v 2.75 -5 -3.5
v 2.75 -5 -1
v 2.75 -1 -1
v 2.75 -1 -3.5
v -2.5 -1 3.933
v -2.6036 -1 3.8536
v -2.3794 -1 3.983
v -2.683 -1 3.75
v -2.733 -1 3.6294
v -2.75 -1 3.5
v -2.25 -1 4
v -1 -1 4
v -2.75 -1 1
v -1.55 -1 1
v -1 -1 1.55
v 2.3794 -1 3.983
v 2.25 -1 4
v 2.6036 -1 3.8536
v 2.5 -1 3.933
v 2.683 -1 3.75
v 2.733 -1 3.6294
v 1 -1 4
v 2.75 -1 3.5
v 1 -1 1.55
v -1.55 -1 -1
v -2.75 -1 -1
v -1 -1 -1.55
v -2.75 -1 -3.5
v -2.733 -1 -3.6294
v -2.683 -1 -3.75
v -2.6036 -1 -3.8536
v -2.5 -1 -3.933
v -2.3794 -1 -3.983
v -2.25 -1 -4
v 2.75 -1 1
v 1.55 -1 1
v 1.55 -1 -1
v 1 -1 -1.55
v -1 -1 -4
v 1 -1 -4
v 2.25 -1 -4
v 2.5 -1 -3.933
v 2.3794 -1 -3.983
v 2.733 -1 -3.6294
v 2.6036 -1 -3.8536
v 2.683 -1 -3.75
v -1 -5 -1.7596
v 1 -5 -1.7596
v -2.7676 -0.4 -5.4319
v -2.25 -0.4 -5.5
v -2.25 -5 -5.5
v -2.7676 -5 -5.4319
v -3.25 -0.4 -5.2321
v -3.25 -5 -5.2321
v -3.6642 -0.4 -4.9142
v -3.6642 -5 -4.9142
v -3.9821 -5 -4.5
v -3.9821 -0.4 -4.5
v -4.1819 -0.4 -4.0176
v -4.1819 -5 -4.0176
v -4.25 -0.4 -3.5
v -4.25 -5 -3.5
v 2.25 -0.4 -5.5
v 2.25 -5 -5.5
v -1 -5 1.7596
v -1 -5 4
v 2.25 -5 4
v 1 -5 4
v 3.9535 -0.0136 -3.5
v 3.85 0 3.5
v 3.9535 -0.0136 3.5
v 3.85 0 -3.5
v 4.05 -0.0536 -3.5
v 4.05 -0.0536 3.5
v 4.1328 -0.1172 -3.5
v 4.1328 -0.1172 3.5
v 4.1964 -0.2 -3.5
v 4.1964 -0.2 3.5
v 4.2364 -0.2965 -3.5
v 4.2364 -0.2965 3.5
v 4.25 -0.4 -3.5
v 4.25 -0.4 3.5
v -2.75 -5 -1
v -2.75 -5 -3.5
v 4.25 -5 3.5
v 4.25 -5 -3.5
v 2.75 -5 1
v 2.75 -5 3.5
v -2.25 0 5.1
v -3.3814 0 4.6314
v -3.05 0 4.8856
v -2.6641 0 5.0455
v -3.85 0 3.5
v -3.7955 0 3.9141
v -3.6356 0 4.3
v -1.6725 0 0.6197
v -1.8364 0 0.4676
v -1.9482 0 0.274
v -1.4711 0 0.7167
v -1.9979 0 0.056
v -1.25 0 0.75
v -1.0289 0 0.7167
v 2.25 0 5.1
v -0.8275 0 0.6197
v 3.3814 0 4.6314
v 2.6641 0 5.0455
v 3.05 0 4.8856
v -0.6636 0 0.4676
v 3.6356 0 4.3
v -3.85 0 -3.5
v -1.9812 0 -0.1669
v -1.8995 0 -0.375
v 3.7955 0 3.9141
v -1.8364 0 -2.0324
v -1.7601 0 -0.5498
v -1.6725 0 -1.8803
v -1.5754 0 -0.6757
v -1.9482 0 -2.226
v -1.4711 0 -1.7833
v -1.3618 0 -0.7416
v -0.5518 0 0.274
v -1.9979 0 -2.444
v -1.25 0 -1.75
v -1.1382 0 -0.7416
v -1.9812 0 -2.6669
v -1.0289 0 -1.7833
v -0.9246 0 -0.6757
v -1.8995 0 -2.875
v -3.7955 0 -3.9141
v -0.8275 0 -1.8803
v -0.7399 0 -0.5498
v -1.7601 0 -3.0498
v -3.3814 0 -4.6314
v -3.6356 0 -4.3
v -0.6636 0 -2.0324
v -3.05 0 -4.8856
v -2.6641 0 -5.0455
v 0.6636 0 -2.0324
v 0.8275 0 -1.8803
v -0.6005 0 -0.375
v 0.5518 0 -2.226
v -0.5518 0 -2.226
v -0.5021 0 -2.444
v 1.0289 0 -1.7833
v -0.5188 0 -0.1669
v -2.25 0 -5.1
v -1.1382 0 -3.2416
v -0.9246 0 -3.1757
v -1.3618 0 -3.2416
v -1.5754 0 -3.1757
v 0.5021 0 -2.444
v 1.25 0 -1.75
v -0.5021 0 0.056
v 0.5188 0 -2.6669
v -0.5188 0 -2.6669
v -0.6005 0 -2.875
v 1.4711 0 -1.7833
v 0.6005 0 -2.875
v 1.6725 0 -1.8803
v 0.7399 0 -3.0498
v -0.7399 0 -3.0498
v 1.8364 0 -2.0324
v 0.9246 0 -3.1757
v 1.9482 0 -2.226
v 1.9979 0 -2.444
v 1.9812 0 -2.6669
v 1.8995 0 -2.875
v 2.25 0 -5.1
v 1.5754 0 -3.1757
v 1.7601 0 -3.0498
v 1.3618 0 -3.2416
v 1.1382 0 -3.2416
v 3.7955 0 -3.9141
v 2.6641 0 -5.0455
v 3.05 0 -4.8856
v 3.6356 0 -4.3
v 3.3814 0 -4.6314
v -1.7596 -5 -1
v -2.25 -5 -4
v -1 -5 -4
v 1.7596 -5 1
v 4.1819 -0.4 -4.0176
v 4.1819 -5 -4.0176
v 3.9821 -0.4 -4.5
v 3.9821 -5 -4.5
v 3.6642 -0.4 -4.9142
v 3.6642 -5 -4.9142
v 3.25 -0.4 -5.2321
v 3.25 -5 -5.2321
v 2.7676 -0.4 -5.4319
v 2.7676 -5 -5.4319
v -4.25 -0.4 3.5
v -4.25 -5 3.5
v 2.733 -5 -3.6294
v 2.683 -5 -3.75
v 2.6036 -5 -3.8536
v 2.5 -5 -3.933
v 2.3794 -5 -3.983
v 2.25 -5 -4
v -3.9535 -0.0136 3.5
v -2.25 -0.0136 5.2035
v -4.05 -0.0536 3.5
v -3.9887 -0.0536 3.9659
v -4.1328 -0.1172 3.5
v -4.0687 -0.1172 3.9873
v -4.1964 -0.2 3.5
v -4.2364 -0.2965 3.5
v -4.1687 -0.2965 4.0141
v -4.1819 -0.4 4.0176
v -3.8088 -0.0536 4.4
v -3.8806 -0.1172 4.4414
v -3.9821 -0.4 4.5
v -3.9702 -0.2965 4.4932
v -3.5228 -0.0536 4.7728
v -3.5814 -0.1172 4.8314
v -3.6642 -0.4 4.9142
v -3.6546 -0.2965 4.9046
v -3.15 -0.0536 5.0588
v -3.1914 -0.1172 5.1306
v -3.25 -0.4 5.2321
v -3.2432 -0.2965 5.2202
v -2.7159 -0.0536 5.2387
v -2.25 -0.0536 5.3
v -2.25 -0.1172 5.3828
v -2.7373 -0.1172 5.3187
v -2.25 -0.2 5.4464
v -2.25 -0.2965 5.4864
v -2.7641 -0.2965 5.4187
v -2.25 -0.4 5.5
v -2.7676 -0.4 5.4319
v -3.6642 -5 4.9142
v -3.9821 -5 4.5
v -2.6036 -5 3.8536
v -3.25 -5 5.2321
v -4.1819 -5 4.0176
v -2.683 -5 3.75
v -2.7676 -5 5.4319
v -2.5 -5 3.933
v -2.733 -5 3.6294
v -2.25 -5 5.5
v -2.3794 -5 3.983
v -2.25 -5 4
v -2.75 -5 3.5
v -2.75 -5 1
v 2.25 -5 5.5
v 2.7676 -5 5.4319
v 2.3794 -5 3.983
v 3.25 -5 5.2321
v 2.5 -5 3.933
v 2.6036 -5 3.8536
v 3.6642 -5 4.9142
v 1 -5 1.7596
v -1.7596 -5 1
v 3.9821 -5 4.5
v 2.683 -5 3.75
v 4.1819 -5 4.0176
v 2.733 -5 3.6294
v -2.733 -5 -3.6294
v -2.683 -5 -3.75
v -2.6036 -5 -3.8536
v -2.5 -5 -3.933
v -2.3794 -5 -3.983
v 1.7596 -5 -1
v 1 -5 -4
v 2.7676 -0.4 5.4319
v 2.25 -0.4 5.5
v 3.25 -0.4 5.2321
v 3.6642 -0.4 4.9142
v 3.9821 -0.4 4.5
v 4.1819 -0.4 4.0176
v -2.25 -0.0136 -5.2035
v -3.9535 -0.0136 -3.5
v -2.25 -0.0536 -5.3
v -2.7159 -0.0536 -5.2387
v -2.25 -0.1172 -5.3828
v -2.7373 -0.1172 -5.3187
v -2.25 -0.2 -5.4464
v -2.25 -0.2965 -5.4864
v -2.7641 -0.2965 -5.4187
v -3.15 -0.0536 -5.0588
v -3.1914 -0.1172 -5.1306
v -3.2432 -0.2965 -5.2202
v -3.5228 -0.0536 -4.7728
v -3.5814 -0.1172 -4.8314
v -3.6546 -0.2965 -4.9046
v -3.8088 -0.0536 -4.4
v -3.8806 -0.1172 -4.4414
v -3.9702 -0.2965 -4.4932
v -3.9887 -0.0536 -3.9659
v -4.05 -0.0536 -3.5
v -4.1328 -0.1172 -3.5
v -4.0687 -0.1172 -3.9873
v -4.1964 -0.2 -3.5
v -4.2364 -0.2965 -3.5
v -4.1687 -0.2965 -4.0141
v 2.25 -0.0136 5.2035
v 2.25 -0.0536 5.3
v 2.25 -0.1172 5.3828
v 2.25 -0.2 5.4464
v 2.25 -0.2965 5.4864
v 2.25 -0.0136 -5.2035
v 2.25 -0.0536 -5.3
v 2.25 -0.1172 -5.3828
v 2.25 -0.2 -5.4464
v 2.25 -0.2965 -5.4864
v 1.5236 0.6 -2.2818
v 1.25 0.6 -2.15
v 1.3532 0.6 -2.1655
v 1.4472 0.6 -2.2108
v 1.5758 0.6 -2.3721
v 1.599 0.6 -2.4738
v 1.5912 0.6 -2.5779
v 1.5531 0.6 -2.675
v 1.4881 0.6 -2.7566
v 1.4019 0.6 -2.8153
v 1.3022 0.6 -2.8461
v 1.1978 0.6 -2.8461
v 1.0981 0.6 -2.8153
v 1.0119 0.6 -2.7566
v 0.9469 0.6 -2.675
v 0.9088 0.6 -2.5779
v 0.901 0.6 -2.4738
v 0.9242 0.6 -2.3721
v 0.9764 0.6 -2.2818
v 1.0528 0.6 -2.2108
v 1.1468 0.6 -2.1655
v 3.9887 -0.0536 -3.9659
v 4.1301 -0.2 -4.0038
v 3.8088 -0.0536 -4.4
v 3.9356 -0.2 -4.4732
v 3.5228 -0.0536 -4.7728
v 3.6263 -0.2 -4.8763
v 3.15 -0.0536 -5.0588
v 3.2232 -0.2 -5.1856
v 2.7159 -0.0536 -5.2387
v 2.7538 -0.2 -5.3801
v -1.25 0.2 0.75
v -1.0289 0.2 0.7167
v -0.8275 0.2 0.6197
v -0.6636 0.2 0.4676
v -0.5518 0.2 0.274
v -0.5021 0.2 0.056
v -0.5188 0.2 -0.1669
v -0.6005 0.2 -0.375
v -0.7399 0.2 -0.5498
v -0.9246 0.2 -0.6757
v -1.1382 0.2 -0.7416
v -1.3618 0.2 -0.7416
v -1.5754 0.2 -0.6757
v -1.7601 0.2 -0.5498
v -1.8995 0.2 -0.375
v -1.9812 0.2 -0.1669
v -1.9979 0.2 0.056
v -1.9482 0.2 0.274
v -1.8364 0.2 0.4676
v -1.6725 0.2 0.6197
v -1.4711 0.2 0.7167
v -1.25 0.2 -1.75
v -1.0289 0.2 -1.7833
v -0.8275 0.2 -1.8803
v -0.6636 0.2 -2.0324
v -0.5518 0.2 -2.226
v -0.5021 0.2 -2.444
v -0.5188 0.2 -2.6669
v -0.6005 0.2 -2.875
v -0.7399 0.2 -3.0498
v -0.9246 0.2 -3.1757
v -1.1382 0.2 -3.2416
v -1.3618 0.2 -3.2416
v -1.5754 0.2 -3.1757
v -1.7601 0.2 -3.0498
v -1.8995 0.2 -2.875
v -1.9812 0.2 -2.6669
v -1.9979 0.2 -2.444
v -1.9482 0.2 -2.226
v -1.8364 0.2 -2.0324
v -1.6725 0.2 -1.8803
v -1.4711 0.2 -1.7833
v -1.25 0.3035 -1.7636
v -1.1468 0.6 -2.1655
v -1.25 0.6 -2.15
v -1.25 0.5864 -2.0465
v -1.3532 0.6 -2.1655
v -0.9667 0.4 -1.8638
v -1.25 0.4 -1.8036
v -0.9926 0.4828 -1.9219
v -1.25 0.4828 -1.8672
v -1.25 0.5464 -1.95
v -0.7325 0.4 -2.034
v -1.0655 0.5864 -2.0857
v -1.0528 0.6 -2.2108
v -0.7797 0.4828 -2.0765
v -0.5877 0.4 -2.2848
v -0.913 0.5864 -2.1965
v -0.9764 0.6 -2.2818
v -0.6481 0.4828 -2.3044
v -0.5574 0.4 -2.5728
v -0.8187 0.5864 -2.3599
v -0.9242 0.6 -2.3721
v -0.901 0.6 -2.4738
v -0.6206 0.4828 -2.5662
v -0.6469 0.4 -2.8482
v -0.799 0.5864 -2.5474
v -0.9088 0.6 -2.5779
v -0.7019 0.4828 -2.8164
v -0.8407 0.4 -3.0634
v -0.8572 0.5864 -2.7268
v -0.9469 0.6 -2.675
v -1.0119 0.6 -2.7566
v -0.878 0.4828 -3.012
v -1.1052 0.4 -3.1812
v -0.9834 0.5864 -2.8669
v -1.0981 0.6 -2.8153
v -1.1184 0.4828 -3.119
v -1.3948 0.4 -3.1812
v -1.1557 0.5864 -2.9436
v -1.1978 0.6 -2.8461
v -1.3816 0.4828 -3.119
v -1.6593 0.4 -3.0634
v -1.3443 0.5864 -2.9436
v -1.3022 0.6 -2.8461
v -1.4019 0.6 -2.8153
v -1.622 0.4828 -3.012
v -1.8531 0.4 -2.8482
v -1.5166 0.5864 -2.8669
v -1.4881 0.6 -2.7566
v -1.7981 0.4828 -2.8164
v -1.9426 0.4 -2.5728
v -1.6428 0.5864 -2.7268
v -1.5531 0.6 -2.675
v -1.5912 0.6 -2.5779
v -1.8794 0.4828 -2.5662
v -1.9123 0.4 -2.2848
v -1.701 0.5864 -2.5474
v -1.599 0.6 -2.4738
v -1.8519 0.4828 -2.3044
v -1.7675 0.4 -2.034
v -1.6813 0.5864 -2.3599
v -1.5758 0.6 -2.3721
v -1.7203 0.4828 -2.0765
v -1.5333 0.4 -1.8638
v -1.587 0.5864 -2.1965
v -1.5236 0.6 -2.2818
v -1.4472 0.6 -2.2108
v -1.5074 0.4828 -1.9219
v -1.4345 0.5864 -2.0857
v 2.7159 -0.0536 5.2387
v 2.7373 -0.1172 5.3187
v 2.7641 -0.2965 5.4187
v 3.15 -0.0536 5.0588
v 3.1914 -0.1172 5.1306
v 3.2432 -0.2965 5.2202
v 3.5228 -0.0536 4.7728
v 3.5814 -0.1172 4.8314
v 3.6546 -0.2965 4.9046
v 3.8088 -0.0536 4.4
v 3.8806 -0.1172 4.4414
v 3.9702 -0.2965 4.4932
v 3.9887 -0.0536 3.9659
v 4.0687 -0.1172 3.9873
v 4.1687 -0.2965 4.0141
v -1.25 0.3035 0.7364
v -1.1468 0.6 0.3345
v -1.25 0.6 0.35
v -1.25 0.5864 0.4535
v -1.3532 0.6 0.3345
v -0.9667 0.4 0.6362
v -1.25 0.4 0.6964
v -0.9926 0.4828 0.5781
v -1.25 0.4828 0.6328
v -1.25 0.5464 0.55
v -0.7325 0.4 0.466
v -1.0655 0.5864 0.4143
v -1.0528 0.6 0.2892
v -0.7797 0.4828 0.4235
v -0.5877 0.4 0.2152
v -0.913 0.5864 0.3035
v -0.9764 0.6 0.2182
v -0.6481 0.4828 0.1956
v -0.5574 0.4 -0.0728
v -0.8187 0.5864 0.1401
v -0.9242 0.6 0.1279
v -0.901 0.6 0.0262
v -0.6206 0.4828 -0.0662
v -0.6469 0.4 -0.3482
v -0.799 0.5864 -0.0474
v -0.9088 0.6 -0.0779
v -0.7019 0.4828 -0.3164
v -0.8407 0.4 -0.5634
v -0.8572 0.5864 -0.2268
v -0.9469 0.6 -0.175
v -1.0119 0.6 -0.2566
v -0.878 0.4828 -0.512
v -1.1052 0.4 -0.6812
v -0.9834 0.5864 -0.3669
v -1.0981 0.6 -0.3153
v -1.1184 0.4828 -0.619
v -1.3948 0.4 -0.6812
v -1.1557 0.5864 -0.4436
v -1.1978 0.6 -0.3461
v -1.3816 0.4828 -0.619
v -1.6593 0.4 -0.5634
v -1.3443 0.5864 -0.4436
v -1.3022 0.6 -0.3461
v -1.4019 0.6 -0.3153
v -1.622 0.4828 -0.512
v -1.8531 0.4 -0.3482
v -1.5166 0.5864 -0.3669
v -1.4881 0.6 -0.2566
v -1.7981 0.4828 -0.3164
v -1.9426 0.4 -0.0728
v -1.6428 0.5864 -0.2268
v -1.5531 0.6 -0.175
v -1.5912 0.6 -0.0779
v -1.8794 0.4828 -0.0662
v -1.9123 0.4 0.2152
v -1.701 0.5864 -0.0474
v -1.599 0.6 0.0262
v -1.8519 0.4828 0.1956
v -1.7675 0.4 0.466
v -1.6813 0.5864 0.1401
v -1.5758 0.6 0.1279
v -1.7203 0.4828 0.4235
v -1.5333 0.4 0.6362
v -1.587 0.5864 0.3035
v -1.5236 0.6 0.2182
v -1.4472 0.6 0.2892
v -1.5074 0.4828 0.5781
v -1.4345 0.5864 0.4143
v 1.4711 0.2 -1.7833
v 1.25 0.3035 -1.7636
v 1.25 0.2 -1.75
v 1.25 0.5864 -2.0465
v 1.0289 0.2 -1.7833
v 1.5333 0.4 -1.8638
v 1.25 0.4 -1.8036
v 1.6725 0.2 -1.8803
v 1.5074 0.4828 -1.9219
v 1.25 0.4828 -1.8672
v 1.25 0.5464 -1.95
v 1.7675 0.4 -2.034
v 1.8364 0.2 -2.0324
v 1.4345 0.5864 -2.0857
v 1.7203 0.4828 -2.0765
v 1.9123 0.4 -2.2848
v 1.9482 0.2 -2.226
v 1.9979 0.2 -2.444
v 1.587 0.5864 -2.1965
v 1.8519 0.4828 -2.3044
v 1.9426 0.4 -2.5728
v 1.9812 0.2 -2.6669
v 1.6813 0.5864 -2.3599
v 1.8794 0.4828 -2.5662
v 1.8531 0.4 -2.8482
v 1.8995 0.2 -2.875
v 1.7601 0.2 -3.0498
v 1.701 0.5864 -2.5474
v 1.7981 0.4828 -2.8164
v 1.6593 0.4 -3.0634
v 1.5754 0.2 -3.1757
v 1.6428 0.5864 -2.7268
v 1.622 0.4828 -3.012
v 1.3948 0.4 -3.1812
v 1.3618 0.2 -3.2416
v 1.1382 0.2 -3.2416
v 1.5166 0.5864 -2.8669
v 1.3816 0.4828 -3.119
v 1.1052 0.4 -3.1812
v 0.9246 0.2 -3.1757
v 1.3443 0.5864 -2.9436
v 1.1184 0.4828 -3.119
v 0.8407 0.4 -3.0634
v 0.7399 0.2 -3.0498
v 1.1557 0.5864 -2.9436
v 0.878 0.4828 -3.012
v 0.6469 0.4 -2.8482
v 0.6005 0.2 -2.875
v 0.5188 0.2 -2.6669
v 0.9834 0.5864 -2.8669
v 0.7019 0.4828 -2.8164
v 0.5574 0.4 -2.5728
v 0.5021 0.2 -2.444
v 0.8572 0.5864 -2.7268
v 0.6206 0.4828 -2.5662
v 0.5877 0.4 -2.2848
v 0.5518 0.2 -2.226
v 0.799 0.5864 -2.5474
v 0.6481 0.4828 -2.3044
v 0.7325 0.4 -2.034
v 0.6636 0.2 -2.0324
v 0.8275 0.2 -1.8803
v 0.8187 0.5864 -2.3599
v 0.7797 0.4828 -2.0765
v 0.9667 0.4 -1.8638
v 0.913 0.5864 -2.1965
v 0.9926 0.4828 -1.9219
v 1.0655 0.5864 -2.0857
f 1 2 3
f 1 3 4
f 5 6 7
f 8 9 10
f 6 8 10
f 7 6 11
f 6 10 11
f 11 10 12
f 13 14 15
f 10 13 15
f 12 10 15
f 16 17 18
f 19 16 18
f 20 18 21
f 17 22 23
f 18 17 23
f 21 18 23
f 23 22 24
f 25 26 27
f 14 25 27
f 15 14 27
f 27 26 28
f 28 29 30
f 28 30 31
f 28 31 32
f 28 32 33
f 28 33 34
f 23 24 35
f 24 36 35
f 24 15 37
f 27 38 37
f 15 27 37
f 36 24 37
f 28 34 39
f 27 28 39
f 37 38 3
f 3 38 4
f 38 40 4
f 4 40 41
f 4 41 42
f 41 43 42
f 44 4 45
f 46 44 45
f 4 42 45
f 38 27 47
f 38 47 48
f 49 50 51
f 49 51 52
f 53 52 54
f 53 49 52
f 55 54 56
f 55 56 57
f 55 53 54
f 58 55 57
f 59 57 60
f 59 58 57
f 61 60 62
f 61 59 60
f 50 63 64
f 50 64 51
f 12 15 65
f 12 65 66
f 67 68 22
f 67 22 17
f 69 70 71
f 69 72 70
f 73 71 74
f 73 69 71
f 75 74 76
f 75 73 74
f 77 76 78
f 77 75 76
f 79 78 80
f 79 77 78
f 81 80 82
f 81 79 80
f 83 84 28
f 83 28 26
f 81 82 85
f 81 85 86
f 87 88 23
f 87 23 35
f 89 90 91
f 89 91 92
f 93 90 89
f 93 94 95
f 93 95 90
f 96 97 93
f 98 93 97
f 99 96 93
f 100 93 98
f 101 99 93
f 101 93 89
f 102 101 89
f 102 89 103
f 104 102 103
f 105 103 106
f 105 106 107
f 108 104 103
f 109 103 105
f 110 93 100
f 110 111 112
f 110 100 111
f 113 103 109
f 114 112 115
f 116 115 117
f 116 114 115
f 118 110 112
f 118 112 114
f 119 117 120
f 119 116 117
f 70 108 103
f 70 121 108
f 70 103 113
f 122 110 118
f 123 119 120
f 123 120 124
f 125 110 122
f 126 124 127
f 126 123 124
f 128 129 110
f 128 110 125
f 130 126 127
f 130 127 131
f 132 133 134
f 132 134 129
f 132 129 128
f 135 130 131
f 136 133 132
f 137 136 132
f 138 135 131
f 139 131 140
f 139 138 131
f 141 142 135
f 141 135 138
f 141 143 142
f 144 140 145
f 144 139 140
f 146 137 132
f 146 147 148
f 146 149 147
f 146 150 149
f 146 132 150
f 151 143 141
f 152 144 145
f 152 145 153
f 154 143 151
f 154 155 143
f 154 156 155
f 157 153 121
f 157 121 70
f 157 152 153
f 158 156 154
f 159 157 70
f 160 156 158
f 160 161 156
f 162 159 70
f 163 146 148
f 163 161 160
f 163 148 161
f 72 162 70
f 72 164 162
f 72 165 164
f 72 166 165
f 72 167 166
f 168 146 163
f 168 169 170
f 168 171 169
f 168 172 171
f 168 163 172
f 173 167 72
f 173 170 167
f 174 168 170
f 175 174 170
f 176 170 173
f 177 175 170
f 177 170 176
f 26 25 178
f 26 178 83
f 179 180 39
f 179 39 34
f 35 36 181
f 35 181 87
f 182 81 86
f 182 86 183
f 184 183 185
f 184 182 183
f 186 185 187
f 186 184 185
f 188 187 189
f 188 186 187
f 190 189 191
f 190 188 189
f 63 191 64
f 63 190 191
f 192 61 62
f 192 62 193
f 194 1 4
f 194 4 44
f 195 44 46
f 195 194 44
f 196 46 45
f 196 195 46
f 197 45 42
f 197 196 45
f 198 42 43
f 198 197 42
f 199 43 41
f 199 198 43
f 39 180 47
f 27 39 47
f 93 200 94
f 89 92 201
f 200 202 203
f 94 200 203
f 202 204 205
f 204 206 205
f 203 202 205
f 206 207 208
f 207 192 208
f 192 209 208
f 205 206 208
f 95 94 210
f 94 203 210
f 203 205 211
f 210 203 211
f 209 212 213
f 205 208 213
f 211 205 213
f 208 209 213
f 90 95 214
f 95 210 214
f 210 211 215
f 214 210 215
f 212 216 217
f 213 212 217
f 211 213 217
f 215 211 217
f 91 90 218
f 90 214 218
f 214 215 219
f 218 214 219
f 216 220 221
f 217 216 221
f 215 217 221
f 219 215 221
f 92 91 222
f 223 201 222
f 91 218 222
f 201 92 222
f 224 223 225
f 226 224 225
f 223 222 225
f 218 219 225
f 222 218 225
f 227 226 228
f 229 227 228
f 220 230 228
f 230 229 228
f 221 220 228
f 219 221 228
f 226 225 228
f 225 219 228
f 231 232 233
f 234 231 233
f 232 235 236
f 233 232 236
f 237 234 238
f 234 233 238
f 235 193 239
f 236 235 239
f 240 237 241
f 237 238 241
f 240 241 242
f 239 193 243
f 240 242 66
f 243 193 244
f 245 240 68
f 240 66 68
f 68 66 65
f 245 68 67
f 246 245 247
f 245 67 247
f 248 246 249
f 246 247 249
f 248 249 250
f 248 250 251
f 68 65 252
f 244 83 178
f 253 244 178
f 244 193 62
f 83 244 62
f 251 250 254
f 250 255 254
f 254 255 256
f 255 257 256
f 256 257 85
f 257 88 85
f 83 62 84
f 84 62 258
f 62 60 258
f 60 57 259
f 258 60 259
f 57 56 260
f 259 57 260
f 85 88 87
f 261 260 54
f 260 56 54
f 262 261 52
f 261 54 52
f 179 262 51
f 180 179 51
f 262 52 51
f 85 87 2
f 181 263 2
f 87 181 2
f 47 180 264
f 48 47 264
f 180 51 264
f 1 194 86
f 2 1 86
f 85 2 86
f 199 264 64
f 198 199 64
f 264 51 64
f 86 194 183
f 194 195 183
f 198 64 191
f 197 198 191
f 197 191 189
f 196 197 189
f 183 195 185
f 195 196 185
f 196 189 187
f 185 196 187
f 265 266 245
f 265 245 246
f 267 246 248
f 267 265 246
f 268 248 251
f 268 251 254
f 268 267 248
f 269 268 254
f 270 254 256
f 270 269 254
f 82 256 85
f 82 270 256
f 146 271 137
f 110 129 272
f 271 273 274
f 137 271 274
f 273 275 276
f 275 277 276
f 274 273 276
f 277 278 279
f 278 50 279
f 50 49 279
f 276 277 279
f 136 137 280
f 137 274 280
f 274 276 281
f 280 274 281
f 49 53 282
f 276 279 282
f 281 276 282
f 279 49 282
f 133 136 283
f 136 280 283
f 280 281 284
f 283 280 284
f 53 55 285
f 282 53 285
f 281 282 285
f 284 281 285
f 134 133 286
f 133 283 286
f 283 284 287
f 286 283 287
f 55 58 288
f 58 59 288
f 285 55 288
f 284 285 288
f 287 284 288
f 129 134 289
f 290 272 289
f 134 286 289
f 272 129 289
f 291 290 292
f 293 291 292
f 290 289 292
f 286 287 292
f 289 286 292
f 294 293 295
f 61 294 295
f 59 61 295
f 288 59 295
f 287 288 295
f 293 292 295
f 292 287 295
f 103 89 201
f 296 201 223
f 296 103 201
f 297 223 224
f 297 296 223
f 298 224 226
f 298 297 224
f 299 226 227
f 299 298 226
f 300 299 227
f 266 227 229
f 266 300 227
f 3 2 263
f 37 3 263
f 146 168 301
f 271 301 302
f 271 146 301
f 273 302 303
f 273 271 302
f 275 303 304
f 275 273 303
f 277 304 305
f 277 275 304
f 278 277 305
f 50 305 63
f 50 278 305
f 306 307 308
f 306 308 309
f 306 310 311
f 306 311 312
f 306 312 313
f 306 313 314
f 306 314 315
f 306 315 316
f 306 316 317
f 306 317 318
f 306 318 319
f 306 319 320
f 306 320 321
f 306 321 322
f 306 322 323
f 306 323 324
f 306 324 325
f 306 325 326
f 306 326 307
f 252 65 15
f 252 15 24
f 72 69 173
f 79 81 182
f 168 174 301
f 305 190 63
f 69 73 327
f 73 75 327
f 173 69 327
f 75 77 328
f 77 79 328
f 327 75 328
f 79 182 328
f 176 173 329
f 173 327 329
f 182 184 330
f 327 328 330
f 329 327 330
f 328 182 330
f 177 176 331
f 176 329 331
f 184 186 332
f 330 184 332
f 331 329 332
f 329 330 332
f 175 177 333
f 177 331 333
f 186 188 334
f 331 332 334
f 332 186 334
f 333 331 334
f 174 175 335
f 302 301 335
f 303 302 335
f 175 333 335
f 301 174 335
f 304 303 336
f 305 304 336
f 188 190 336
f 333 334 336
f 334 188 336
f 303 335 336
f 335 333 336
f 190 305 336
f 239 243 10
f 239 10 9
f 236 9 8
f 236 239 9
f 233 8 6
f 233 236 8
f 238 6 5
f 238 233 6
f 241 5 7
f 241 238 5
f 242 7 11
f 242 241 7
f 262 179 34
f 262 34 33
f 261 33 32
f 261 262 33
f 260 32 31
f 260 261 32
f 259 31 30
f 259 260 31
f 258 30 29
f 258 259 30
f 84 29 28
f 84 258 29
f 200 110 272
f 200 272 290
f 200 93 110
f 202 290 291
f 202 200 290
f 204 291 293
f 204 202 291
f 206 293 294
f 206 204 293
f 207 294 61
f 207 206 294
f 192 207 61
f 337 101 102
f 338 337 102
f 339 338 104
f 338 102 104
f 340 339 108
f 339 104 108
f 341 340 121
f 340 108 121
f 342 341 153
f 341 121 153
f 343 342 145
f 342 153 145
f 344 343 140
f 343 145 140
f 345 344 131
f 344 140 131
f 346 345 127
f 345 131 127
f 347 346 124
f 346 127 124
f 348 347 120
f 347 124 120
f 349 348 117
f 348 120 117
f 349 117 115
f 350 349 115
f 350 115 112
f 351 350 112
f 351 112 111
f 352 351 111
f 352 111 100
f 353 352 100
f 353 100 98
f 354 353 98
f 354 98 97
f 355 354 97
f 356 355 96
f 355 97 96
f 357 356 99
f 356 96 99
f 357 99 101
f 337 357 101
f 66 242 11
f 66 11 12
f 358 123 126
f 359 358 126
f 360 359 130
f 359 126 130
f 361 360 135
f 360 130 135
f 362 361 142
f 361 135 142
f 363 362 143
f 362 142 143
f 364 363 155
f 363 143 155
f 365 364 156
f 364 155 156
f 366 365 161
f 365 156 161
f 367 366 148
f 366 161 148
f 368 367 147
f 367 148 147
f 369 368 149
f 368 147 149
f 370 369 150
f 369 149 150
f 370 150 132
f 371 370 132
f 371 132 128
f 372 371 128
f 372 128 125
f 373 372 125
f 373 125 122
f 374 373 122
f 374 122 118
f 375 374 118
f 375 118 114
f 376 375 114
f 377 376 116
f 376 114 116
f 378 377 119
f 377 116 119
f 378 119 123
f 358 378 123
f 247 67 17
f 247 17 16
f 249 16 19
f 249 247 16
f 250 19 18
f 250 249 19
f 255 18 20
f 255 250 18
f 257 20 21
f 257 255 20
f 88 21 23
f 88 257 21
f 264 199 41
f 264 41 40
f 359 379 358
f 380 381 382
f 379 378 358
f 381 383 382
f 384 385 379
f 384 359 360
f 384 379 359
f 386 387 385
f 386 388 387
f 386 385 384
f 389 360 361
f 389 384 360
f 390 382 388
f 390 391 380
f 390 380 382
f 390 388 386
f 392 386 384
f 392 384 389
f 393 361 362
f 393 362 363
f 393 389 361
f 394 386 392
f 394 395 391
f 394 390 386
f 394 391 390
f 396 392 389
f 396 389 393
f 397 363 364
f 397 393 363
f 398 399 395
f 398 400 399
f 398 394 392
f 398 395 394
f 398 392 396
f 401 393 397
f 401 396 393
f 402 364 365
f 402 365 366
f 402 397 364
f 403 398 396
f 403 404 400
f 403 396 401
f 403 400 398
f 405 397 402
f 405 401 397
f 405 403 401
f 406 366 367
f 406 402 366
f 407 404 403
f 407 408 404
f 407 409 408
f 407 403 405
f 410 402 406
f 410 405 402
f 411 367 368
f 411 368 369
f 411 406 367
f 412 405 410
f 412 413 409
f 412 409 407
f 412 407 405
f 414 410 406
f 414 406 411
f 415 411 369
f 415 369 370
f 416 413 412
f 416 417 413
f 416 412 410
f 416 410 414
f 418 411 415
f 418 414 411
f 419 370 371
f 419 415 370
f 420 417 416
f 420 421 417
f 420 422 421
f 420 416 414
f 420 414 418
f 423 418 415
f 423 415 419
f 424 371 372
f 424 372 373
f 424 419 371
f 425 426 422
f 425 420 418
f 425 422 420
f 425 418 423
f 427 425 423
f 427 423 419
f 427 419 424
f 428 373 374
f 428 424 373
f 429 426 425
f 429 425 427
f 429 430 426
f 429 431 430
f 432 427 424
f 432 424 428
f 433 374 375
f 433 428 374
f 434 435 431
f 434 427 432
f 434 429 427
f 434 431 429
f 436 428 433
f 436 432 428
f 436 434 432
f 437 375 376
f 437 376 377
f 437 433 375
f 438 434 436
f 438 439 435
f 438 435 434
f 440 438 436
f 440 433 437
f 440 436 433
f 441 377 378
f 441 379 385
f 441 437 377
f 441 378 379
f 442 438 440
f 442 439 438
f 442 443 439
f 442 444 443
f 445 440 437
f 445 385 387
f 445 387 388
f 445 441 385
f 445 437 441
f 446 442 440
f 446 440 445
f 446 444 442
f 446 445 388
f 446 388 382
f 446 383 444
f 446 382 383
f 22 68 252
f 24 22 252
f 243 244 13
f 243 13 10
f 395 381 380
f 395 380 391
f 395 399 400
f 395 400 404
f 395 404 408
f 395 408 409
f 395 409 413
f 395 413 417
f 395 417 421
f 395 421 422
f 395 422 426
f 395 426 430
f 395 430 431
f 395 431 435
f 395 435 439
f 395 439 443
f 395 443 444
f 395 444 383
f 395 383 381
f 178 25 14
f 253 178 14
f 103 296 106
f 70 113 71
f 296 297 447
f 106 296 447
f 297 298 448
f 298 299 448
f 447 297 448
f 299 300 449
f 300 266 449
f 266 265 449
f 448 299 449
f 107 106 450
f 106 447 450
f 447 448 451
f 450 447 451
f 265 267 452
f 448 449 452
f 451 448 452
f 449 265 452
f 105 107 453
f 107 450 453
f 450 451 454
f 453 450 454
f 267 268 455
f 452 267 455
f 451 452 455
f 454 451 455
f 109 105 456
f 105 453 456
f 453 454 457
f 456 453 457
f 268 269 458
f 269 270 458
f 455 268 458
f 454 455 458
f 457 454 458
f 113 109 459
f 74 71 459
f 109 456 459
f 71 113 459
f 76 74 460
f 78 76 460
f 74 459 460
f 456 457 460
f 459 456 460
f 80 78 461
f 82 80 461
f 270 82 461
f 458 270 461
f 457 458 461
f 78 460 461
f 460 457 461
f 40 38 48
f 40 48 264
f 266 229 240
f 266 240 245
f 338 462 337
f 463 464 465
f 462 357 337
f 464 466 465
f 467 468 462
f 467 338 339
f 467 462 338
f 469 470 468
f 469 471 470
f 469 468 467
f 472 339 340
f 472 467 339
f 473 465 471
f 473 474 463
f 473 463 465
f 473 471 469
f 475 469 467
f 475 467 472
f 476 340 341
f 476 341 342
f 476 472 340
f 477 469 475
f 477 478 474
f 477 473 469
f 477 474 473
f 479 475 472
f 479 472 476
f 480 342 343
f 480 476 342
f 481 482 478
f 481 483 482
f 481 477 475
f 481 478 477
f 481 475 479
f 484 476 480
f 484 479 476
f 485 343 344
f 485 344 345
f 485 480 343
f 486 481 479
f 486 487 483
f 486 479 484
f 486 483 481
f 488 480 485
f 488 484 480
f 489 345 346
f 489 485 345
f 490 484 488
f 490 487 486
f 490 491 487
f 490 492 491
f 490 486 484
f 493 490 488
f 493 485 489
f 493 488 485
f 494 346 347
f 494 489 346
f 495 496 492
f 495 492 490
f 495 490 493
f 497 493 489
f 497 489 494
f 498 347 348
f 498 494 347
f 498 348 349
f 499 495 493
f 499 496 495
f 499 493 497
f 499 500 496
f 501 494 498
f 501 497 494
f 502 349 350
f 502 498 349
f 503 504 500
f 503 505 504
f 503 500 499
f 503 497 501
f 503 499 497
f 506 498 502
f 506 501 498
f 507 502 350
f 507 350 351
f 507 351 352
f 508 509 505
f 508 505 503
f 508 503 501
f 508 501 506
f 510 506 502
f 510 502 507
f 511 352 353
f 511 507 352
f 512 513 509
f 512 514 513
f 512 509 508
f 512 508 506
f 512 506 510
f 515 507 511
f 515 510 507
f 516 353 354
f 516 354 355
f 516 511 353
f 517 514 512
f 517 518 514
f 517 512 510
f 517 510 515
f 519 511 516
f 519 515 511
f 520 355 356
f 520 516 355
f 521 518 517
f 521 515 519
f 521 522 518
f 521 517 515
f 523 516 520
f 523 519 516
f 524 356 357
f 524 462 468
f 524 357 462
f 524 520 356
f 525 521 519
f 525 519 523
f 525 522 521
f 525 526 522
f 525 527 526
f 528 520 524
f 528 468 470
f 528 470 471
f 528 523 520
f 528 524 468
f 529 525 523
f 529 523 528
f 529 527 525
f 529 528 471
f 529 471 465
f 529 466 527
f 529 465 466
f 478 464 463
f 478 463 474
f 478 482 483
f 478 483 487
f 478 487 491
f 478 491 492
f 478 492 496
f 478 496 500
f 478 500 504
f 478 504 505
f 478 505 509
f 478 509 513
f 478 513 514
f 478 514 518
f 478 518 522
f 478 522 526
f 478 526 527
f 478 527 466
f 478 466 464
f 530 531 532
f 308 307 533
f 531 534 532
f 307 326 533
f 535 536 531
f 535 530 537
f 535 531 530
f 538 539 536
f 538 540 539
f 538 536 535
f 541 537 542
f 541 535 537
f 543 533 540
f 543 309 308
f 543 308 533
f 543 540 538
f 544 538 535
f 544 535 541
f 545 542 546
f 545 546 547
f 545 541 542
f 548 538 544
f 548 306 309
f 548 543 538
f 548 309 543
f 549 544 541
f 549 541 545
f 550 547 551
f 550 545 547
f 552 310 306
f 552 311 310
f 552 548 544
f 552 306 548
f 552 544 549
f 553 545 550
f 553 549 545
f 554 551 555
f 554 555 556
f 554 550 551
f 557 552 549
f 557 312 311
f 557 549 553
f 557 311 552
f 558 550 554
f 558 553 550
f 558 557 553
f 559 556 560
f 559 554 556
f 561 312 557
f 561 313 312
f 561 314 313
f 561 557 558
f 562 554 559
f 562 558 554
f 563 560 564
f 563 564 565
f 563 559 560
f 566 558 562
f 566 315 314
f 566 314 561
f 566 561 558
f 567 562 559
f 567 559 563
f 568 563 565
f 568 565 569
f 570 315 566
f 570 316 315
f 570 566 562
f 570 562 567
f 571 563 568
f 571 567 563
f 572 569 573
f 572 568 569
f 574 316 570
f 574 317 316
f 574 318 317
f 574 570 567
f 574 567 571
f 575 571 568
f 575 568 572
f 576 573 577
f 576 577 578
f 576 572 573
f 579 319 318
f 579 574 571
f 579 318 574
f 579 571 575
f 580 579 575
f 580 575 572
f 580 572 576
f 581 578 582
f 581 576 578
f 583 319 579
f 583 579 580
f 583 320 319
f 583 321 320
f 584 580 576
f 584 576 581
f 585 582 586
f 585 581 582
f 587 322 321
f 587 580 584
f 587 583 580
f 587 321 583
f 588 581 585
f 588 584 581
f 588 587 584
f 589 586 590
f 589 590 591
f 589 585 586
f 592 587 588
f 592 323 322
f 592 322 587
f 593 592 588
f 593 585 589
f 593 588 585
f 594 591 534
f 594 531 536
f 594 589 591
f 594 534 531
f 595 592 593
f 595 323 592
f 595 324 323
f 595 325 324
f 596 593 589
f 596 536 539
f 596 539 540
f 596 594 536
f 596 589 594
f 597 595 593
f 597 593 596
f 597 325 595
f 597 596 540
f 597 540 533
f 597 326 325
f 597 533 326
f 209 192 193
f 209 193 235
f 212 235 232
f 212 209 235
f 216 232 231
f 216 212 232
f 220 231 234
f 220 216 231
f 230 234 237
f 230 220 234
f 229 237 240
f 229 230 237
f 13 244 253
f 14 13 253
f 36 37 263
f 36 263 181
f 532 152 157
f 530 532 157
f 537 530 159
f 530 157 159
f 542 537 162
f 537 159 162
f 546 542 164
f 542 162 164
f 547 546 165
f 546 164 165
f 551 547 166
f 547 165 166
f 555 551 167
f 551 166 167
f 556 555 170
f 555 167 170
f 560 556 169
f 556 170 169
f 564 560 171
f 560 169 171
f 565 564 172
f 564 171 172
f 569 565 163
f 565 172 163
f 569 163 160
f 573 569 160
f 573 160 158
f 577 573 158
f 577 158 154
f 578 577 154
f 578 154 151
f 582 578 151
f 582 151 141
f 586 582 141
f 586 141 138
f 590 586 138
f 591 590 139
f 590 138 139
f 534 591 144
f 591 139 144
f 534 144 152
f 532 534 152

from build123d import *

# Parameters (mm, degrees)
BOSS_EXTRUDE1_DEPTH = 5
SKETCH1_3_R         = 0.75
BOSS_EXTRUDE2_DEPTH = 0.6
FILLET2_R           = 0.4
SHELL1_START        = -5
SHELL1_DEPTH        = 4
BOSS_EXTRUDE4_DEPTH = 4
SKETCH4_W           = 3.1
SKETCH4_H           = 3.1
CUT_EXTRUDE1_DEPTH  = 9.019507466
CUT_EXTRUDE1_DRAFT  = -3


# Read off the part's stored shape, not the designer's step: Shell1
with BuildPart() as part:
    # Sketch1 → Boss-Extrude1 (new body)
    with BuildSketch(Plane(origin=(0, 0, 0), x_dir=(1, 0, 0), z_dir=(0, 1, 0))):
        with BuildLine():
            Line((-2.25, -5.5), (2.25, -5.5))
            ThreePointArc((2.25, -5.5), (3.664213562, -4.914213562), (4.25, -3.5))
            Line((4.25, -3.5), (4.25, 3.5))
            ThreePointArc((4.25, 3.5), (3.664213562, 4.914213562), (2.25, 5.5))
            Line((2.25, 5.5), (-2.25, 5.5))
            ThreePointArc((-2.25, 5.5), (-3.664213562, 4.914213562), (-4.25, 3.5))
            Line((-4.25, 3.5), (-4.25, -3.5))
            ThreePointArc((-4.25, -3.5), (-3.664213562, -4.914213562), (-2.25, -5.5))
        make_face()
    extrude(amount=-BOSS_EXTRUDE1_DEPTH)

    # Sketch1<3> → Boss-Extrude2 (add)
    with BuildSketch(Plane(origin=(0, 0, 0), x_dir=(1, 0, 0), z_dir=(0, 1, 0))):
        with Locations(Location((1.25, 2.5, 0), (0, 0, 270))):
            Circle(SKETCH1_3_R)
        with Locations(Location((-1.25, 0, 0), (0, 0, 270))):
            Circle(SKETCH1_3_R)
        with Locations(Location((-1.25, 2.5, 0), (0, 0, 270))):
            Circle(SKETCH1_3_R)
    extrude(amount=BOSS_EXTRUDE2_DEPTH)

    # Fillet2
    fillet2_edges = [part.edges().sort_by_distance(p)[0] for p in [
        (3.664213562, 0, -4.914213562),
        (4.25, 0, 0),
        (3.664213562, 0, 4.914213562),
        (0, 0, 5.5),
        (-1.25, 0.6, -3.25),
        (-1.25, 0.6, -0.75),
        (1.25, 0.6, -3.25),
        (-3.664213562, 0, 4.914213562),
        (-4.25, 0, 0),
        (-3.664213562, 0, -4.914213562),
        (0, 0, -5.5),
    ]]
    fillet(fillet2_edges, radius=FILLET2_R)

    # Shell1 outline → Shell1 (cut)
    with BuildSketch(Plane(origin=(0, 0, 0), x_dir=(1, 0, 0), z_dir=(0, 1, 0)).offset(SHELL1_START)):
        with BuildLine():
            ThreePointArc((-2.75, -3.5), (-2.603553391, -3.853553391), (-2.25, -4))
            Line((-2.25, -4), (2.25, -4))
            ThreePointArc((2.25, -4), (2.603553391, -3.853553391), (2.75, -3.5))
            Line((2.75, -3.5), (2.75, 3.5))
            ThreePointArc((2.75, 3.5), (2.603553391, 3.853553391), (2.25, 4))
            Line((2.25, 4), (-2.25, 4))
            ThreePointArc((-2.25, 4), (-2.603553391, 3.853553391), (-2.75, 3.5))
            Line((-2.75, 3.5), (-2.75, -3.5))
        make_face()
    extrude(amount=SHELL1_DEPTH, mode=Mode.SUBTRACT)

    # Sketch3 → Boss-Extrude4 (add)
    with BuildSketch(Plane.XZ.offset(1)):
        Polygon((-1, 4), (1, 4), (1, 1), (2.75, 1), (2.75, -1), (1, -1), (1, -4), (-1, -4), (-1, -1), (-2.75, -1), (-2.75, 1), (-1, 1), align=None)
    extrude(amount=BOSS_EXTRUDE4_DEPTH)


with BuildPart() as cut_extrude1_tool:
    # Sketch4 → Cut-Extrude1 (with draft: the straight prism first)
    with BuildSketch(Plane.XZ.offset(1)):
        Rectangle(SKETCH4_W, SKETCH4_H)
    extrude(amount=CUT_EXTRUDE1_DEPTH)
    # Cut-Extrude1: the draft: its side faces are tilted about the plane it starts from
    cut_extrude1_sides = [cut_extrude1_tool.faces().sort_by_distance(p)[0] for p in [
        (0, -5.509753733, -1.55),
        (1.55, -5.509753733, 0),
        (0, -5.509753733, 1.55),
        (-1.55, -5.509753733, 0),
    ]]
    draft(cut_extrude1_sides, Plane.XZ.offset(1), CUT_EXTRUDE1_DRAFT)


with BuildPart() as part_1:
    add(part.part)

    # Cut-Extrude1: cut by cut_extrude1_tool
    add(cut_extrude1_tool.part, mode=Mode.SUBTRACT)


solid = part_1.part
